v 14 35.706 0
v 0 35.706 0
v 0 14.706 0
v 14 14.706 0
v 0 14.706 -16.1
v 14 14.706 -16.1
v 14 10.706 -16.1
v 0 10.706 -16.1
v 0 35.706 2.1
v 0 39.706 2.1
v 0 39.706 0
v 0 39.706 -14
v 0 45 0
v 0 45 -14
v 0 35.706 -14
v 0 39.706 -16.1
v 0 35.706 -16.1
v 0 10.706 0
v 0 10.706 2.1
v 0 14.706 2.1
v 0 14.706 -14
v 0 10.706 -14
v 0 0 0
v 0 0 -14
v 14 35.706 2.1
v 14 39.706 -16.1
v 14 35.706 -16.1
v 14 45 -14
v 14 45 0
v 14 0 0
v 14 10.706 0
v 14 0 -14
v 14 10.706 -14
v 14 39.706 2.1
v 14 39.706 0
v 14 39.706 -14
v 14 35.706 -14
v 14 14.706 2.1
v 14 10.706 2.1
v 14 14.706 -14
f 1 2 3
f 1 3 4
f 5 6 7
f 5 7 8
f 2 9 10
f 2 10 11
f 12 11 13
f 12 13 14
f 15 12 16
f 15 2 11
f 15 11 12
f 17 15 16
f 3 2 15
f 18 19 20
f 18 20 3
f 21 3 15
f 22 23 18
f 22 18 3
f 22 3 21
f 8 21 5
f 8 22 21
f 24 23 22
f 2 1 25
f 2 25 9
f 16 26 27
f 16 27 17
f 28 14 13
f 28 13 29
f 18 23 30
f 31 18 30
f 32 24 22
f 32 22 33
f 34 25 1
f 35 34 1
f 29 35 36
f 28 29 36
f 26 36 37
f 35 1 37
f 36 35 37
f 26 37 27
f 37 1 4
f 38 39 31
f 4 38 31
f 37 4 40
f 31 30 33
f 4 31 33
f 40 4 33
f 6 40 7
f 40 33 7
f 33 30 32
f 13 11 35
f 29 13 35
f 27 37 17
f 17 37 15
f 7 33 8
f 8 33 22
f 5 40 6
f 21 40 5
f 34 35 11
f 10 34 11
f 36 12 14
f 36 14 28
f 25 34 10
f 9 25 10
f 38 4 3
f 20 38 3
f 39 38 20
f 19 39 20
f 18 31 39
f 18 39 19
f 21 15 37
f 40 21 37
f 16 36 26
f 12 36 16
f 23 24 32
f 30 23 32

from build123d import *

# Parameters (mm, degrees)
SKETCH1_W           = 14
SKETCH1_H           = 14
BOSS_EXTRUDE1_DEPTH = 45
SKETCH2_W           = 14
SKETCH2_H           = 4
BOSS_EXTRUDE2_DEPTH = 2.1


with BuildPart() as part:
    # Sketch1 → Boss-Extrude1 (new body)
    with BuildSketch(Plane(origin=(0, 0, 0), x_dir=(1, 0, 0), z_dir=(0, 1, 0))):
        with Locations((7, 7)):
            Rectangle(SKETCH1_W, SKETCH1_H)
    extrude(amount=BOSS_EXTRUDE1_DEPTH)

    # Sketch2 → Boss-Extrude2 (add)
    with BuildSketch(Plane(origin=(0, 0, -14), x_dir=(-1, 0, 0), z_dir=(0, 0, -1))):
        with Locations((-7, 37.706344583)):
            Rectangle(SKETCH2_W, SKETCH2_H)
        with Locations((-7, 12.706344583)):
            Rectangle(SKETCH2_W, SKETCH2_H)
    boss_extrude2 = extrude(amount=BOSS_EXTRUDE2_DEPTH)

    # Mirror1: Boss-Extrude2 across plane
    add(boss_extrude2.mirror(Plane.XY.offset(-7)))


solid = part.part
